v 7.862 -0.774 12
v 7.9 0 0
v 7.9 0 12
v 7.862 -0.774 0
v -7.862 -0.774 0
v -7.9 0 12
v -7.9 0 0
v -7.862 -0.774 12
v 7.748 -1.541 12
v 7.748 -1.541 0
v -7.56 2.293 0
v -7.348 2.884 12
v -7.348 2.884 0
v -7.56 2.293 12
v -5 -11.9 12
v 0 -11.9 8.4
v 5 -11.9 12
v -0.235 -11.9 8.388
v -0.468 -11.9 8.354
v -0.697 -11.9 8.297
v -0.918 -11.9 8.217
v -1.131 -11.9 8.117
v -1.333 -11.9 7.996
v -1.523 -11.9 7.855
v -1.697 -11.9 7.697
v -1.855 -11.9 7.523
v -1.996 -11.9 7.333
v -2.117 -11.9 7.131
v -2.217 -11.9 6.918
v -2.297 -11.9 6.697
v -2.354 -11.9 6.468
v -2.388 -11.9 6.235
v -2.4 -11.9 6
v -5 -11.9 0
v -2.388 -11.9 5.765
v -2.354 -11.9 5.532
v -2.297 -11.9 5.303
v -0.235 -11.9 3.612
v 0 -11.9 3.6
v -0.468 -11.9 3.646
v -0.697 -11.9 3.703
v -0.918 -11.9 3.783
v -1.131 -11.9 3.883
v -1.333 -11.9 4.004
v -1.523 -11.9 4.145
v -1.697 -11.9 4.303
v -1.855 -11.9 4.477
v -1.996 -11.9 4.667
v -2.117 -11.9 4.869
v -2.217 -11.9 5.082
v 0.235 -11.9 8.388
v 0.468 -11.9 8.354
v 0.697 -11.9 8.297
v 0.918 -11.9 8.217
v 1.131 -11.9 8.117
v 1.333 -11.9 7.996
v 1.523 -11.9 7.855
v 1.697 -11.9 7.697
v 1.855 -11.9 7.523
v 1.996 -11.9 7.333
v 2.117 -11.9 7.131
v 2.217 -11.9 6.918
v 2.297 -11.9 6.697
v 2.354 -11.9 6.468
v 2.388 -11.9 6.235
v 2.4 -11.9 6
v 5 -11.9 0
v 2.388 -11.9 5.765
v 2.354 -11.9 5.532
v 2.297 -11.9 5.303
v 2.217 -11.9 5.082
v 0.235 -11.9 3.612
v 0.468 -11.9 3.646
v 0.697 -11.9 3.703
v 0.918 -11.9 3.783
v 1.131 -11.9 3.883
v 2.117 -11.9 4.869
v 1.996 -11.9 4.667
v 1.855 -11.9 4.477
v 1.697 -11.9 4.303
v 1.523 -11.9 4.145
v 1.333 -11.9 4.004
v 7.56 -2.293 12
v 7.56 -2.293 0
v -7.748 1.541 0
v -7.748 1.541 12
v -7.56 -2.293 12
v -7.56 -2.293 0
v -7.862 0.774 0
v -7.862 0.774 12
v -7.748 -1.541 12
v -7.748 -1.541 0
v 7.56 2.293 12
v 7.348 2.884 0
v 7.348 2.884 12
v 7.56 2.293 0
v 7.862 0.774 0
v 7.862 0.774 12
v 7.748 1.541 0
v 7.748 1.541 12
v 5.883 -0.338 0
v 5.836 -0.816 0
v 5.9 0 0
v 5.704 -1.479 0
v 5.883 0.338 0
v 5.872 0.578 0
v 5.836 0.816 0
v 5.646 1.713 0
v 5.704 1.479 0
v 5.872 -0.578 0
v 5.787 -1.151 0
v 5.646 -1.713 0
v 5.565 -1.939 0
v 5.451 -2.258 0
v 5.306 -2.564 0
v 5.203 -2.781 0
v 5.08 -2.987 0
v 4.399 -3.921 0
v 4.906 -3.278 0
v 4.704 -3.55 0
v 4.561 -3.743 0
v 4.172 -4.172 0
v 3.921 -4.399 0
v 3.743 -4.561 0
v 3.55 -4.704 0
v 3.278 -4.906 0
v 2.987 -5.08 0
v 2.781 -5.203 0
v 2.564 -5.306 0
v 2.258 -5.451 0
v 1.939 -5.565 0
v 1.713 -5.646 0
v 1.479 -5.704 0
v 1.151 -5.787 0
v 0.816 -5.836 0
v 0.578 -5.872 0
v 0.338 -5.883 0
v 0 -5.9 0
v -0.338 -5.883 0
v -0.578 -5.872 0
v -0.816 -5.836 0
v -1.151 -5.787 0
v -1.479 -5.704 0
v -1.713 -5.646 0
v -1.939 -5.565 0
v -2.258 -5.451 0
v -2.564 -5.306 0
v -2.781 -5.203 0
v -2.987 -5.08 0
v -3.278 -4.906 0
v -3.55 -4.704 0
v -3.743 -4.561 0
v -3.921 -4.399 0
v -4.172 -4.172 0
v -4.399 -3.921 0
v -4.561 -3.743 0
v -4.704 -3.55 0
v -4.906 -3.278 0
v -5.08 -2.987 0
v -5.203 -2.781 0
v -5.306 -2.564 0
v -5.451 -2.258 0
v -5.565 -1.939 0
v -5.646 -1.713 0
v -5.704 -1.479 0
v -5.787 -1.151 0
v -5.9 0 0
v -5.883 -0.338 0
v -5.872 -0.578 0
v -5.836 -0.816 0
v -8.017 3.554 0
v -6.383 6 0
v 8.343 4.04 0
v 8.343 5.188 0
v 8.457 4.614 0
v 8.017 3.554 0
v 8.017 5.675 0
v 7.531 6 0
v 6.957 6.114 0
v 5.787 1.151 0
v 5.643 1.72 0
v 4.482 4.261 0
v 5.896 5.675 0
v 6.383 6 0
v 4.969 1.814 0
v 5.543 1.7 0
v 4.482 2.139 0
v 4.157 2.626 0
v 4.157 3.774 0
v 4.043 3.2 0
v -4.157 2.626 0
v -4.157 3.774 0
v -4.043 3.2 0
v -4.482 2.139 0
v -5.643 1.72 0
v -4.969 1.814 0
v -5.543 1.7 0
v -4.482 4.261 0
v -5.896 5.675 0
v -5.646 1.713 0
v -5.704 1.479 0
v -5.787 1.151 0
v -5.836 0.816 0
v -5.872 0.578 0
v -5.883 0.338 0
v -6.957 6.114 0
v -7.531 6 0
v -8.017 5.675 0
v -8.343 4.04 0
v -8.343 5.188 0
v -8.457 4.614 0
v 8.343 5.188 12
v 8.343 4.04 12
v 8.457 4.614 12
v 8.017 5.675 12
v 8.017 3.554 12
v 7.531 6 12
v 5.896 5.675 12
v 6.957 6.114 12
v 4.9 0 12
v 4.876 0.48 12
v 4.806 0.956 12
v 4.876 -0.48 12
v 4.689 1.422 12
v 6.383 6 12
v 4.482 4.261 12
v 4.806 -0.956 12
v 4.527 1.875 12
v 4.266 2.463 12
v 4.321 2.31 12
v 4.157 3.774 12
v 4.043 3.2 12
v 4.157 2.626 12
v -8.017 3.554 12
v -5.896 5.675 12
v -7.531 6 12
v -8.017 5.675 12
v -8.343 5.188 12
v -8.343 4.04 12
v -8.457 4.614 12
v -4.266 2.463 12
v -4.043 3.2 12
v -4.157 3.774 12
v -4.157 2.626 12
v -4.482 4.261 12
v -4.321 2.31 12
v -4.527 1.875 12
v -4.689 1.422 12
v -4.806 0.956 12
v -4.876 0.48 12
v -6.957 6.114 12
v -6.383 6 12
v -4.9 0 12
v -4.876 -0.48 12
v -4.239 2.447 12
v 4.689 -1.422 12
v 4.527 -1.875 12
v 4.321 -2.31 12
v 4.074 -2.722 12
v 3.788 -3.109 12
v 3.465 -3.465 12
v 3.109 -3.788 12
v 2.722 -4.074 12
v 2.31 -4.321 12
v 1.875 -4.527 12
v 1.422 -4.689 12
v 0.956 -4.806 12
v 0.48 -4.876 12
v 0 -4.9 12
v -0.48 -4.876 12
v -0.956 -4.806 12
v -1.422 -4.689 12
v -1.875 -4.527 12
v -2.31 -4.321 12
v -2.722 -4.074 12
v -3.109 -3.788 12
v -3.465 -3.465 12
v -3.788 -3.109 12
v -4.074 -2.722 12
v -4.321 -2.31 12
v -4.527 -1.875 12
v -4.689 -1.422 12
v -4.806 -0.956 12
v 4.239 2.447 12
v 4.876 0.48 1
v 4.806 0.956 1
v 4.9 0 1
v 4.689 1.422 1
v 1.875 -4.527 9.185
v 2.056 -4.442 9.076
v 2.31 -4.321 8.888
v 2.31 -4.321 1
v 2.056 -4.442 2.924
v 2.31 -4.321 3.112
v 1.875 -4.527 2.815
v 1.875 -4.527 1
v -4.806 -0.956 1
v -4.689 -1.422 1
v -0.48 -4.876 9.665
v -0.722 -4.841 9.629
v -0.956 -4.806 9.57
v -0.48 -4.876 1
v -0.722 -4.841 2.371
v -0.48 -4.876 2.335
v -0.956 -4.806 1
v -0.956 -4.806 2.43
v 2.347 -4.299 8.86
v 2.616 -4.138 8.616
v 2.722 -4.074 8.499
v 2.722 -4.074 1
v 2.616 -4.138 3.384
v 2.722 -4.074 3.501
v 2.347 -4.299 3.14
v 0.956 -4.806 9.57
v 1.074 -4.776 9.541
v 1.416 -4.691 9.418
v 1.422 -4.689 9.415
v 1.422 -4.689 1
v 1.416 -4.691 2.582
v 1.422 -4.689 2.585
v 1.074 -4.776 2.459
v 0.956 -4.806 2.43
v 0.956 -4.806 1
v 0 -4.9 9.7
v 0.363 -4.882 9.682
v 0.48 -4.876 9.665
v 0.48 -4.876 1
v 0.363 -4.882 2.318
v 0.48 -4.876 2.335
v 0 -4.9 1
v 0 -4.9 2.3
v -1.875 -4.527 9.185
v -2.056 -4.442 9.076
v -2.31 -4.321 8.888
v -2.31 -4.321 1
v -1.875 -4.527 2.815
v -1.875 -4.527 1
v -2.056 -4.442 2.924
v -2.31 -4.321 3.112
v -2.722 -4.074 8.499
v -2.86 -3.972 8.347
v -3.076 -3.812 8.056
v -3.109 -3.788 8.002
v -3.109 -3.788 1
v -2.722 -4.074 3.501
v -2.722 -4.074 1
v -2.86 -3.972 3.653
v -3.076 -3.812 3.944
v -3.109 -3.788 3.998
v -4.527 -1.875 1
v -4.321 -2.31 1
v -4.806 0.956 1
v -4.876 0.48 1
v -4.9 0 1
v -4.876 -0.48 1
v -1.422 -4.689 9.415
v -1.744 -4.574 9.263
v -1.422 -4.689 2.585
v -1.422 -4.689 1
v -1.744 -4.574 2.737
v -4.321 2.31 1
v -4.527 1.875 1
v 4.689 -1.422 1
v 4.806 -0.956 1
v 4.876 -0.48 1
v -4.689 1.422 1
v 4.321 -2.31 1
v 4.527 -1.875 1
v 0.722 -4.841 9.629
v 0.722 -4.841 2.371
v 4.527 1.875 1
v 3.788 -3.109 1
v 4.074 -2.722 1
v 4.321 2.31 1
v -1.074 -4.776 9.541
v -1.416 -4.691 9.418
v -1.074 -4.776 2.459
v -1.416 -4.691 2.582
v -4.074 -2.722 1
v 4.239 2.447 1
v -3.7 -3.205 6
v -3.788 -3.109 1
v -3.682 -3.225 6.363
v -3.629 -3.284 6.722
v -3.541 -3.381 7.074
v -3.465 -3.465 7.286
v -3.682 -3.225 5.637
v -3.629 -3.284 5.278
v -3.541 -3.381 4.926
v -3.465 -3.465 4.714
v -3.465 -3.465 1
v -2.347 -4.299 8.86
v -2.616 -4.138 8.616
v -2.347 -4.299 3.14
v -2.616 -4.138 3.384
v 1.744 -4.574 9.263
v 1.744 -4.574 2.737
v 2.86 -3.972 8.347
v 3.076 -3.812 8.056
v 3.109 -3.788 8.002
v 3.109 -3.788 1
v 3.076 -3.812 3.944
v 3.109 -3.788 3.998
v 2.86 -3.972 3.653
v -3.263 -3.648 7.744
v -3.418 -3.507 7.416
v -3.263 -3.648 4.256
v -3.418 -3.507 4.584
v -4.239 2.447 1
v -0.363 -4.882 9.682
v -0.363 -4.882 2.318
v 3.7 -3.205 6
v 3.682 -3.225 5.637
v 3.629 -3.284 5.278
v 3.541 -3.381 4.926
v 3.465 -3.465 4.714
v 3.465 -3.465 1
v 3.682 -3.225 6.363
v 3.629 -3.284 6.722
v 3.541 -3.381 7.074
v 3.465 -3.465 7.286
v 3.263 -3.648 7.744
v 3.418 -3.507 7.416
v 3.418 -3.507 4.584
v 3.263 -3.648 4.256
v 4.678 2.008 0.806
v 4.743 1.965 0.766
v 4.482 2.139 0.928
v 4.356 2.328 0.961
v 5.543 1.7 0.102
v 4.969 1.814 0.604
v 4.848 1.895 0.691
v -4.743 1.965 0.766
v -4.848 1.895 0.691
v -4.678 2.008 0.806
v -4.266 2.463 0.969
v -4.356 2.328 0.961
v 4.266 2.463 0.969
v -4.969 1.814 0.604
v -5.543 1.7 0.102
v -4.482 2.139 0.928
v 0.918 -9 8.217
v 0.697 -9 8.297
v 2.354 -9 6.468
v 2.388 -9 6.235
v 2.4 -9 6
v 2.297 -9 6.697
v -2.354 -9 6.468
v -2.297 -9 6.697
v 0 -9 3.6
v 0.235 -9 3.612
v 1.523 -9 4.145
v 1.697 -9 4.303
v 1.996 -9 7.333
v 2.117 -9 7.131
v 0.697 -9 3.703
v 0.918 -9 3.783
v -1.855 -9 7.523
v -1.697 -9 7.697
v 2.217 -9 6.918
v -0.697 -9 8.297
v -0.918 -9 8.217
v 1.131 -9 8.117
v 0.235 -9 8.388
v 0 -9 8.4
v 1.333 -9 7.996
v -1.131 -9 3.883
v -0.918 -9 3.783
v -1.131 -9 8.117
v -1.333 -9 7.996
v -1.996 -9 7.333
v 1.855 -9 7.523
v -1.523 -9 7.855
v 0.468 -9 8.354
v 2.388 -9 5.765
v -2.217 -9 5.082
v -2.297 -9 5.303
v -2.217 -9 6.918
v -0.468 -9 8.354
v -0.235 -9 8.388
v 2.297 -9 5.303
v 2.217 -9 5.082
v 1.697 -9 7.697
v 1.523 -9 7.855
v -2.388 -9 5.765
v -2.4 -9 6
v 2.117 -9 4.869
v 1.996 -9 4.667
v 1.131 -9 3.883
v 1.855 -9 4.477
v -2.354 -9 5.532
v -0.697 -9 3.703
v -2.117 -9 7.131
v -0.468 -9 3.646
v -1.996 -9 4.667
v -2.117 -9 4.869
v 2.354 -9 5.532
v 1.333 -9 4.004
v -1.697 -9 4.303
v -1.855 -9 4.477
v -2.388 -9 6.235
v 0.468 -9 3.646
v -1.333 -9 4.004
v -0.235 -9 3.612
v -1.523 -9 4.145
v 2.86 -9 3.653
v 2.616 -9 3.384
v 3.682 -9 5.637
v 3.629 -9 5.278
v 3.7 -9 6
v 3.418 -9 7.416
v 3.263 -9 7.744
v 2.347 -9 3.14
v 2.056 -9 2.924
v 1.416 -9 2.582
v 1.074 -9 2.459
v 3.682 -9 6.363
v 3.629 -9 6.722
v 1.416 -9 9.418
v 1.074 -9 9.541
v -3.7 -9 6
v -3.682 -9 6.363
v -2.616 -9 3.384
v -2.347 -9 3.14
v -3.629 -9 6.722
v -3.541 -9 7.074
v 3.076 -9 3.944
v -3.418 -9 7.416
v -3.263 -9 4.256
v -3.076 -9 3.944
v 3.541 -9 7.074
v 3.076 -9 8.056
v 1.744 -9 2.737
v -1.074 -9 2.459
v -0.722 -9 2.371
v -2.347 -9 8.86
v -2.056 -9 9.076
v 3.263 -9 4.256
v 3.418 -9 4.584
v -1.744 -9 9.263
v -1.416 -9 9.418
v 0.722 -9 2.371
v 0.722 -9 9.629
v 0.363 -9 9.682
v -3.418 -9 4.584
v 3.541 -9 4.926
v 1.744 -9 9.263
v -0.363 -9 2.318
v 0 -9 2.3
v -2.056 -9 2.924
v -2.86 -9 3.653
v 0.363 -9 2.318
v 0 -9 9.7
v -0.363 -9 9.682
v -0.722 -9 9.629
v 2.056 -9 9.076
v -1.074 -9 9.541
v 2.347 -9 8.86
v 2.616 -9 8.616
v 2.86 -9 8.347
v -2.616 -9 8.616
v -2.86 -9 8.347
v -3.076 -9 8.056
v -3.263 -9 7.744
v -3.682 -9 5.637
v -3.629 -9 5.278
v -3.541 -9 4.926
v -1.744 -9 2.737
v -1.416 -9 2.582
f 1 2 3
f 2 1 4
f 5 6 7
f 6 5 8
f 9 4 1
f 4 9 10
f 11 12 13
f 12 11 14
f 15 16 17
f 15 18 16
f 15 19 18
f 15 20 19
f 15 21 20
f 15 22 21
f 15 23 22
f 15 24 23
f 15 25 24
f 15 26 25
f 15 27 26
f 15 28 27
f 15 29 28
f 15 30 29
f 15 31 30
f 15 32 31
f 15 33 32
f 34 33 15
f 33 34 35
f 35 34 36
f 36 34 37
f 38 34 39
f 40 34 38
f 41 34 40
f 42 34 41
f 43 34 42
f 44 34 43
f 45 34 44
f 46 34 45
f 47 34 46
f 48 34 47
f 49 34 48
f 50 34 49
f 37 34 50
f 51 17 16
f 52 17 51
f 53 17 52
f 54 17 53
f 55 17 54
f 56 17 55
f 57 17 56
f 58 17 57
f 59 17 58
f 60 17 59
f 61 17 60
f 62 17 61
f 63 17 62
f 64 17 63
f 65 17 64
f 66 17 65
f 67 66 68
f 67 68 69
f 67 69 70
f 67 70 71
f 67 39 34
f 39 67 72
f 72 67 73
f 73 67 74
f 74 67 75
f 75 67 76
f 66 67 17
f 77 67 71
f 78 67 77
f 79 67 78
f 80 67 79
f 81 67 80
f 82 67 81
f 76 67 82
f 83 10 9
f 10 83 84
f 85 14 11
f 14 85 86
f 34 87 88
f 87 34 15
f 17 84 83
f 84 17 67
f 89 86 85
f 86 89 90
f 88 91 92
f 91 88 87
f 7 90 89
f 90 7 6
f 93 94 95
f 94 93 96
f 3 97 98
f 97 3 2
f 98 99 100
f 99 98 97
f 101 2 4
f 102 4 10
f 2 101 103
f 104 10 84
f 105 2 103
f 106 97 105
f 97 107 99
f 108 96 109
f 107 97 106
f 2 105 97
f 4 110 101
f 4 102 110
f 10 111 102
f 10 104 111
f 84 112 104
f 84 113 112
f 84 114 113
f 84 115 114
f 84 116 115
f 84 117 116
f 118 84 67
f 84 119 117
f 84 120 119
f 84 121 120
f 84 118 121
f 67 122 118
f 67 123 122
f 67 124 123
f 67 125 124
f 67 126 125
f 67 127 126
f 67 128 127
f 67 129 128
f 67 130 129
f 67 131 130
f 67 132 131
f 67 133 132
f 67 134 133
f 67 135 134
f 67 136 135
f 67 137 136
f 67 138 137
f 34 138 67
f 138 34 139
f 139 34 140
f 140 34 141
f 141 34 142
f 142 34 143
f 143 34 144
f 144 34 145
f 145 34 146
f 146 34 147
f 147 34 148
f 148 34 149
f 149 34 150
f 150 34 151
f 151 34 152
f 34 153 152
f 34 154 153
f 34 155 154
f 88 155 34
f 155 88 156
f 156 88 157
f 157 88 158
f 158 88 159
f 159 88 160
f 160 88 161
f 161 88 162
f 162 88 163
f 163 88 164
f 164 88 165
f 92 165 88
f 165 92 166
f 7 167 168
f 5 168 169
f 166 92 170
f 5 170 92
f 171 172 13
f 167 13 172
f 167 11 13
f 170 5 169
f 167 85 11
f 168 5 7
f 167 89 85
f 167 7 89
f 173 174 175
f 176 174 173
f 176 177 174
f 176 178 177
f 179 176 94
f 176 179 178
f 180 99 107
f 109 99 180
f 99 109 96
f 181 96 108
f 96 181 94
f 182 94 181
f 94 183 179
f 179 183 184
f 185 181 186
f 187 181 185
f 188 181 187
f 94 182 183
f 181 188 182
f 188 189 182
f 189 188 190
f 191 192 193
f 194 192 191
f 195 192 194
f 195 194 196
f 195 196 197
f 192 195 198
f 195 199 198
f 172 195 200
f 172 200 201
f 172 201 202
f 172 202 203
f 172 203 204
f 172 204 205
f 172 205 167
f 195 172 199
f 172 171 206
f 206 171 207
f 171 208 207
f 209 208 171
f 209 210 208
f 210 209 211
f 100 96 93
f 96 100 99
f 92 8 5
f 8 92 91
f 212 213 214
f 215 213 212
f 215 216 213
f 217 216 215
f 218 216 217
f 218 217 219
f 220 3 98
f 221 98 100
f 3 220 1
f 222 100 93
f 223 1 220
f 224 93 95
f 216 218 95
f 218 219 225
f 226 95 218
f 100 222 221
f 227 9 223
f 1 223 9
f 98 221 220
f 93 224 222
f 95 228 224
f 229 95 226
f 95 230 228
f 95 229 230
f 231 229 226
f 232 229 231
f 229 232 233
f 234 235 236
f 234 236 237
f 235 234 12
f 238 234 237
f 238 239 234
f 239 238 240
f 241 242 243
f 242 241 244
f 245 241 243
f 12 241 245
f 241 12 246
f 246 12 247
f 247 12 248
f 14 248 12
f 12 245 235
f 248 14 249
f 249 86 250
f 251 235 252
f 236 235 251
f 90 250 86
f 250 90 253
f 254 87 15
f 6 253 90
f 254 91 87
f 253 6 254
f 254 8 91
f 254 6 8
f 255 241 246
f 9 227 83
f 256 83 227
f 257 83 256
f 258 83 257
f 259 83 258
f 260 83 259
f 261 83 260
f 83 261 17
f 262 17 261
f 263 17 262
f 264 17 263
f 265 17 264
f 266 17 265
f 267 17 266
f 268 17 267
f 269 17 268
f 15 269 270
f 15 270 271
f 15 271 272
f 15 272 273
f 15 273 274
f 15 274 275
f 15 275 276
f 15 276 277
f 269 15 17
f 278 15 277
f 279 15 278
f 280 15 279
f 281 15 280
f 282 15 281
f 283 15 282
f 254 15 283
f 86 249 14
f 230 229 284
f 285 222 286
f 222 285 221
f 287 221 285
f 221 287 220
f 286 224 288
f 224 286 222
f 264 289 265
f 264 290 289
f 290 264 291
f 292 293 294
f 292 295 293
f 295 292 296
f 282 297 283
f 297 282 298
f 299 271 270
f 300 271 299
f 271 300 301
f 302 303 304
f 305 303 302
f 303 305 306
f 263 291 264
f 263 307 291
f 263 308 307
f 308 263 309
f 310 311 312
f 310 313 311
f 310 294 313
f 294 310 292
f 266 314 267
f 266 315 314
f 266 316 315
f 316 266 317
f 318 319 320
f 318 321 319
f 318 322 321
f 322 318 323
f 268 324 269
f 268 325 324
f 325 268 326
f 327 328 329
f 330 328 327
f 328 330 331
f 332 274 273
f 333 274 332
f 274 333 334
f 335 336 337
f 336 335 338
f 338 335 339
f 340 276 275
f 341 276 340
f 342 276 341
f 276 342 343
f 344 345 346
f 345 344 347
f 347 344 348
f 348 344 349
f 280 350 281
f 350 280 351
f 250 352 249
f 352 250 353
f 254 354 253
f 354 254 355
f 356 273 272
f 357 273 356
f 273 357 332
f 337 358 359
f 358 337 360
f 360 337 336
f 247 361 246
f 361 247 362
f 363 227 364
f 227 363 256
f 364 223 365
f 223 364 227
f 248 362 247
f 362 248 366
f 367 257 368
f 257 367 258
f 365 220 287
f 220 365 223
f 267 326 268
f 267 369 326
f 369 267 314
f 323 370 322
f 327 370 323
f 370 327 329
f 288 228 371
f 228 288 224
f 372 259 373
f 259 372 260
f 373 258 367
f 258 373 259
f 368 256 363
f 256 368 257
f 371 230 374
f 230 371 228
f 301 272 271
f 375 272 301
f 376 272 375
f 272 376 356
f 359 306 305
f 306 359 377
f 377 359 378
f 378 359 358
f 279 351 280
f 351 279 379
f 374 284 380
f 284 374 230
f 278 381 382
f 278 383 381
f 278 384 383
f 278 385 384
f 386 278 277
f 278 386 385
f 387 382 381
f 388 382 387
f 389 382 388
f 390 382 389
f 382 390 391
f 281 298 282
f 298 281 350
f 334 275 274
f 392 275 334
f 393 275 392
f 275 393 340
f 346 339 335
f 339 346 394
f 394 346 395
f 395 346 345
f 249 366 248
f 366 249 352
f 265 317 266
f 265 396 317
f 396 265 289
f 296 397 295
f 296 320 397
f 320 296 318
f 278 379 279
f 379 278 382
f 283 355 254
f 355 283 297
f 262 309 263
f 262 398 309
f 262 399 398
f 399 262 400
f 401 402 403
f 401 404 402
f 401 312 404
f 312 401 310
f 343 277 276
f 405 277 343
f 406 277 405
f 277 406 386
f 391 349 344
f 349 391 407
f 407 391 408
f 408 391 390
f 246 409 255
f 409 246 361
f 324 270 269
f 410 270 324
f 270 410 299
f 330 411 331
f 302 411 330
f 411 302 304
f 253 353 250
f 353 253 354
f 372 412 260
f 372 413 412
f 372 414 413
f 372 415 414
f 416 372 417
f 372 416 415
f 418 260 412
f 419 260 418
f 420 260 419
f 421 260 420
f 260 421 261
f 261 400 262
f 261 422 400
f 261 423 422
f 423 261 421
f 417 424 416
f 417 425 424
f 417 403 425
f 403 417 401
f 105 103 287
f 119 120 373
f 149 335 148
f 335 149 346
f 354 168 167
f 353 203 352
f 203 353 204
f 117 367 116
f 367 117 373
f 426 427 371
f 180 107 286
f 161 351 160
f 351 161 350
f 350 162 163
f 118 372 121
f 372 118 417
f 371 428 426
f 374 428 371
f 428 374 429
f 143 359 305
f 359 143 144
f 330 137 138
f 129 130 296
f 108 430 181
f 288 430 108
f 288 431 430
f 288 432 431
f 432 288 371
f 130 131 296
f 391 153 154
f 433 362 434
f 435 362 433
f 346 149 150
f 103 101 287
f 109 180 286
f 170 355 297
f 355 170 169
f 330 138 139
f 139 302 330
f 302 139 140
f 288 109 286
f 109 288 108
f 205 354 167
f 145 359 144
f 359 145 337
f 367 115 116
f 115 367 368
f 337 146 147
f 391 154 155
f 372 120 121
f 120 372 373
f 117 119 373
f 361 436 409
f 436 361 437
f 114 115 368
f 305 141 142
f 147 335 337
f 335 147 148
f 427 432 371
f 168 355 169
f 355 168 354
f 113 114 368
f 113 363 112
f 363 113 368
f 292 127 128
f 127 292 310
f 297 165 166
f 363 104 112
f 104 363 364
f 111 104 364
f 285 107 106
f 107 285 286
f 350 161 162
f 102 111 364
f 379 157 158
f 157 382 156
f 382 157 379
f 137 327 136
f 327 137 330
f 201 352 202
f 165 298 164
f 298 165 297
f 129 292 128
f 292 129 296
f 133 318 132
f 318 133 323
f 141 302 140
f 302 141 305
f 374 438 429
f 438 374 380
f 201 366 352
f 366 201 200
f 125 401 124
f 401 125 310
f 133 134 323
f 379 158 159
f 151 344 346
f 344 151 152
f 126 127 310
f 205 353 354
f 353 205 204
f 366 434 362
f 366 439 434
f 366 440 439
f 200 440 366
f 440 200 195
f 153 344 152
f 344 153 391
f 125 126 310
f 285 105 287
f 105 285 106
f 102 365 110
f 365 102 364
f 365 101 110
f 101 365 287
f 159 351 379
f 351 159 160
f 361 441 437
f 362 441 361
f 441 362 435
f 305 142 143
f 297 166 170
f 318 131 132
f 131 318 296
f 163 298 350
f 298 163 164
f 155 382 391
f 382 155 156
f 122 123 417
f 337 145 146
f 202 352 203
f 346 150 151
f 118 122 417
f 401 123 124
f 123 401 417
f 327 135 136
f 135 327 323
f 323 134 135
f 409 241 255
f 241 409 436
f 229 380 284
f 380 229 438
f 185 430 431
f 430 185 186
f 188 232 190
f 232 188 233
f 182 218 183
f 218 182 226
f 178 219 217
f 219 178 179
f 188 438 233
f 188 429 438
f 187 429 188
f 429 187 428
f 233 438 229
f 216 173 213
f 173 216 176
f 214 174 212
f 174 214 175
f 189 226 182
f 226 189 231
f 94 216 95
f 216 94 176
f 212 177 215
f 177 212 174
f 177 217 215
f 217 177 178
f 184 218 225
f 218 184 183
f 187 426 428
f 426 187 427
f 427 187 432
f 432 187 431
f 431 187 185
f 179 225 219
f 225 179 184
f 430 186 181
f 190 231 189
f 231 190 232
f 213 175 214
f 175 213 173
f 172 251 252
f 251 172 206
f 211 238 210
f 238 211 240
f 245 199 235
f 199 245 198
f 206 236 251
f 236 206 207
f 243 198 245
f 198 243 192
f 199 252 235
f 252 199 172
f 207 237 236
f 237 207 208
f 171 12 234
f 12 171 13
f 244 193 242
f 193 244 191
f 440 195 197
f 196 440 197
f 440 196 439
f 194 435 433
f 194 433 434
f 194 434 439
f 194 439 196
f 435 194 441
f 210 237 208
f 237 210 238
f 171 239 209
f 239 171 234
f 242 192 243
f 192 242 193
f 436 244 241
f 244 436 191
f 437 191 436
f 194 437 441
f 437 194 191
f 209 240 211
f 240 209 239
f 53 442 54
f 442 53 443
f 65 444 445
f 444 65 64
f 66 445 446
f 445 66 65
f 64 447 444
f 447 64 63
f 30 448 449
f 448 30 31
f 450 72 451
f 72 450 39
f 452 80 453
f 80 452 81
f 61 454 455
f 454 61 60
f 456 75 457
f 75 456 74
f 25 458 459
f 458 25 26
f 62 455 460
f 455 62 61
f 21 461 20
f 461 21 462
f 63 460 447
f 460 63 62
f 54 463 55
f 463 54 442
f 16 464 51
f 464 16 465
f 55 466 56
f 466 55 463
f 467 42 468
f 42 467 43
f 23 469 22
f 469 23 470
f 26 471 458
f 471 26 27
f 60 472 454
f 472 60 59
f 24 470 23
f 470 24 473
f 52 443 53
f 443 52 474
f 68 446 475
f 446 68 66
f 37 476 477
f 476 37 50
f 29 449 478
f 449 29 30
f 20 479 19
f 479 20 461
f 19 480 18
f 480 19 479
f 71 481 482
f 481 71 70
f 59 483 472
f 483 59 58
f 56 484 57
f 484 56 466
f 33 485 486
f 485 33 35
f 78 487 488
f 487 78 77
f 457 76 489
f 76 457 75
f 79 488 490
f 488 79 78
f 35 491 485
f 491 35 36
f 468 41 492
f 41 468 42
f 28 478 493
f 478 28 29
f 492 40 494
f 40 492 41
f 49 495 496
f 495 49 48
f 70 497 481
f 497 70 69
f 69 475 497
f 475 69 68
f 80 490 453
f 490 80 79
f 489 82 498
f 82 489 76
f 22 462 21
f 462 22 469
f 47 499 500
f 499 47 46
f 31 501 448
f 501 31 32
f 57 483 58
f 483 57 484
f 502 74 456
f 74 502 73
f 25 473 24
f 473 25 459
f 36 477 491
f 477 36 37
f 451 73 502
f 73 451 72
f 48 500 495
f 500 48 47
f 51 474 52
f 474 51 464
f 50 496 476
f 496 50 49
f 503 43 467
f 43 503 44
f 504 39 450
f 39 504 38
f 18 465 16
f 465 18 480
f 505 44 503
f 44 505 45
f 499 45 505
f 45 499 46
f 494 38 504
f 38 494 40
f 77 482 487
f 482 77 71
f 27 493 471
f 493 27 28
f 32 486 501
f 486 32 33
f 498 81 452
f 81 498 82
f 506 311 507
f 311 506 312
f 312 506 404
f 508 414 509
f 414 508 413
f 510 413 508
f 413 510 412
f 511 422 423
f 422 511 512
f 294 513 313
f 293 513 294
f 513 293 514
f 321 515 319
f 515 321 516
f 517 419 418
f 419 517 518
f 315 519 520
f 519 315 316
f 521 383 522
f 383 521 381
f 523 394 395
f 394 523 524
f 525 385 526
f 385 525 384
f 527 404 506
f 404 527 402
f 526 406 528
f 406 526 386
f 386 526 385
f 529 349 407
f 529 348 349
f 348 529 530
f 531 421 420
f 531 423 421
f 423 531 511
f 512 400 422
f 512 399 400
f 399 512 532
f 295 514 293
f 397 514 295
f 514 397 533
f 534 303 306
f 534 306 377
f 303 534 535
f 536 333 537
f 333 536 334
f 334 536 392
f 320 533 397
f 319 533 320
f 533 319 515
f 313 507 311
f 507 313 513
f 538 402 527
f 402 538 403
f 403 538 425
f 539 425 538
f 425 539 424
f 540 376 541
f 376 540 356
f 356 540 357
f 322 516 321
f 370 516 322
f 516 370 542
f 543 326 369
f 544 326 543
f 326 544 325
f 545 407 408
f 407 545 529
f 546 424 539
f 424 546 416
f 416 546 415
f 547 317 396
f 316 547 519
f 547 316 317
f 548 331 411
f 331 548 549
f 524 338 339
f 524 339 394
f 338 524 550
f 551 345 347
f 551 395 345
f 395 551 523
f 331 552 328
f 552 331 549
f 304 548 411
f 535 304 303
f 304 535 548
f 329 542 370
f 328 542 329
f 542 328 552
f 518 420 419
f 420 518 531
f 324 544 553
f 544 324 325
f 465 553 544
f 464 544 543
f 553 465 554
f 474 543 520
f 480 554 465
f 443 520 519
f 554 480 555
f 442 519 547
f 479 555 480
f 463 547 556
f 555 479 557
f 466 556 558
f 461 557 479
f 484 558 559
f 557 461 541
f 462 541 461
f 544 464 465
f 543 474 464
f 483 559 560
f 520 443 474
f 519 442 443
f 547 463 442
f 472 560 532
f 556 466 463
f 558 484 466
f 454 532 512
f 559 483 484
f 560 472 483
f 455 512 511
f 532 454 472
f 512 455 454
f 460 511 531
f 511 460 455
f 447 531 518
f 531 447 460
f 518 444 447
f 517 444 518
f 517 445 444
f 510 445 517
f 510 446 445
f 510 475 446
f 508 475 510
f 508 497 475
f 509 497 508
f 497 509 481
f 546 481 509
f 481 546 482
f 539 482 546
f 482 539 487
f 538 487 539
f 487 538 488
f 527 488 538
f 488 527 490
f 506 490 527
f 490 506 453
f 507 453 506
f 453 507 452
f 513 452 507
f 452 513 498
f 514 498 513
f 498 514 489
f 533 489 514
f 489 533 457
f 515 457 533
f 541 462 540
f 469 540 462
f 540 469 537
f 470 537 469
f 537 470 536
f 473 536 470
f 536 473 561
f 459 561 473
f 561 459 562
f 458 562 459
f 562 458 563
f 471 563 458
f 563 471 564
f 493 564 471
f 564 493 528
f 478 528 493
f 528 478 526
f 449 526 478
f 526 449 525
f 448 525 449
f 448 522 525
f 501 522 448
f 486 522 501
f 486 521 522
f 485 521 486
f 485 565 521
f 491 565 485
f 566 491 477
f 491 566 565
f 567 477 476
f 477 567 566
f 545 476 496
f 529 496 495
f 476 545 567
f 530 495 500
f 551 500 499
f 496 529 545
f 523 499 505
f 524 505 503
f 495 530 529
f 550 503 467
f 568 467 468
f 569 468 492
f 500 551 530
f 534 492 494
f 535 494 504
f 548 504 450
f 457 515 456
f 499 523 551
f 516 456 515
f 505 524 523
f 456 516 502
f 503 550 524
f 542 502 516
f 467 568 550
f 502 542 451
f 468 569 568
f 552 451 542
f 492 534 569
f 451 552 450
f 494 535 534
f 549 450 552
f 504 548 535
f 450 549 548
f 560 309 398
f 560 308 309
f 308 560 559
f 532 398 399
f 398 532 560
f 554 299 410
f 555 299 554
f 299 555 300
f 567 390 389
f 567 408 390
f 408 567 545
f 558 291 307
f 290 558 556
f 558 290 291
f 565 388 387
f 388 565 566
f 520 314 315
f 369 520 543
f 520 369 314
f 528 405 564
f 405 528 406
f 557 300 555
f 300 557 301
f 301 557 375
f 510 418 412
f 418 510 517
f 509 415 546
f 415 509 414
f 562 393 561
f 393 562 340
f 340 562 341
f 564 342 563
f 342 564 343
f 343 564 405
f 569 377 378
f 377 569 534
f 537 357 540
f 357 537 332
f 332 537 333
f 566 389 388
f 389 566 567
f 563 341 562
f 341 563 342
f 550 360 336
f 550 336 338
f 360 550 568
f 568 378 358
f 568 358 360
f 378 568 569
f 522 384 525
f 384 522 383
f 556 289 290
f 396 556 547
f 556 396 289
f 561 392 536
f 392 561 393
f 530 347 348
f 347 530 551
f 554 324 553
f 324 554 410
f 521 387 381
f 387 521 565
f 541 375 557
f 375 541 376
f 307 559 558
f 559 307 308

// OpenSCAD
// file: cylinder_clip.scad
use <../utilities.scad>;

module cylinder_clip(r=1,t=3,opening_angle=120,wing_length=2,wing_angle=45,flat_w=10,flat_t=3,h=10,$fn=$fn){
	union(){
		difference(){
			hull(){
				cylinder(r=r+t,$fn=$fn,h=h);
				translate([-flat_w/2,-r-flat_t,0]) cube([flat_w,0.1,h]);
			}
			cylinder(r=r,$fn=$fn,h=99999,center=true);
			cylinder(r1=r+2,r2=r,$fn=$fn,h=2,center=true);
			scale([tan(opening_angle/2),1,1]) rotate([0,0,45]) translate([0,0,-1]) cube([1,1,1]*9999);
		}
		reflect([1,0,0]) translate([sin(opening_angle/2),cos(opening_angle/2),0]*(r+t/2)) hull() repeat([sin(wing_angle),cos(wing_angle),0]*wing_length,2)
			cylinder(r=t/2,h=h,$fn=16);
			
	}
}

//cylinder_clip(r=3,t=2,flat_w=6);
union(){
	cylinder_clip(r=21,t=4.5,flat_t=10,opening_angle=100,$fn=64);
	translate([-5,-22-5-20,0]) cube([10,20,10]);
}
// main file
use <../utilities.scad>;
use <./cylinder_clip.scad>;

$fn=64;


difference(){
	cylinder_clip(r=5-0.1,t=3,flat_t=7,h=12);
	translate([0,-5-4,12/2]){
		//screw_y(4,fudge=0.9,h=999,shaft=true,extraheight=0);
		rotate([90,0,0]) cylinder(r=2.4,h=999,center=true);
		rotate([-90,0,0]) cylinder(r=3.7,h=999);
	}
}
